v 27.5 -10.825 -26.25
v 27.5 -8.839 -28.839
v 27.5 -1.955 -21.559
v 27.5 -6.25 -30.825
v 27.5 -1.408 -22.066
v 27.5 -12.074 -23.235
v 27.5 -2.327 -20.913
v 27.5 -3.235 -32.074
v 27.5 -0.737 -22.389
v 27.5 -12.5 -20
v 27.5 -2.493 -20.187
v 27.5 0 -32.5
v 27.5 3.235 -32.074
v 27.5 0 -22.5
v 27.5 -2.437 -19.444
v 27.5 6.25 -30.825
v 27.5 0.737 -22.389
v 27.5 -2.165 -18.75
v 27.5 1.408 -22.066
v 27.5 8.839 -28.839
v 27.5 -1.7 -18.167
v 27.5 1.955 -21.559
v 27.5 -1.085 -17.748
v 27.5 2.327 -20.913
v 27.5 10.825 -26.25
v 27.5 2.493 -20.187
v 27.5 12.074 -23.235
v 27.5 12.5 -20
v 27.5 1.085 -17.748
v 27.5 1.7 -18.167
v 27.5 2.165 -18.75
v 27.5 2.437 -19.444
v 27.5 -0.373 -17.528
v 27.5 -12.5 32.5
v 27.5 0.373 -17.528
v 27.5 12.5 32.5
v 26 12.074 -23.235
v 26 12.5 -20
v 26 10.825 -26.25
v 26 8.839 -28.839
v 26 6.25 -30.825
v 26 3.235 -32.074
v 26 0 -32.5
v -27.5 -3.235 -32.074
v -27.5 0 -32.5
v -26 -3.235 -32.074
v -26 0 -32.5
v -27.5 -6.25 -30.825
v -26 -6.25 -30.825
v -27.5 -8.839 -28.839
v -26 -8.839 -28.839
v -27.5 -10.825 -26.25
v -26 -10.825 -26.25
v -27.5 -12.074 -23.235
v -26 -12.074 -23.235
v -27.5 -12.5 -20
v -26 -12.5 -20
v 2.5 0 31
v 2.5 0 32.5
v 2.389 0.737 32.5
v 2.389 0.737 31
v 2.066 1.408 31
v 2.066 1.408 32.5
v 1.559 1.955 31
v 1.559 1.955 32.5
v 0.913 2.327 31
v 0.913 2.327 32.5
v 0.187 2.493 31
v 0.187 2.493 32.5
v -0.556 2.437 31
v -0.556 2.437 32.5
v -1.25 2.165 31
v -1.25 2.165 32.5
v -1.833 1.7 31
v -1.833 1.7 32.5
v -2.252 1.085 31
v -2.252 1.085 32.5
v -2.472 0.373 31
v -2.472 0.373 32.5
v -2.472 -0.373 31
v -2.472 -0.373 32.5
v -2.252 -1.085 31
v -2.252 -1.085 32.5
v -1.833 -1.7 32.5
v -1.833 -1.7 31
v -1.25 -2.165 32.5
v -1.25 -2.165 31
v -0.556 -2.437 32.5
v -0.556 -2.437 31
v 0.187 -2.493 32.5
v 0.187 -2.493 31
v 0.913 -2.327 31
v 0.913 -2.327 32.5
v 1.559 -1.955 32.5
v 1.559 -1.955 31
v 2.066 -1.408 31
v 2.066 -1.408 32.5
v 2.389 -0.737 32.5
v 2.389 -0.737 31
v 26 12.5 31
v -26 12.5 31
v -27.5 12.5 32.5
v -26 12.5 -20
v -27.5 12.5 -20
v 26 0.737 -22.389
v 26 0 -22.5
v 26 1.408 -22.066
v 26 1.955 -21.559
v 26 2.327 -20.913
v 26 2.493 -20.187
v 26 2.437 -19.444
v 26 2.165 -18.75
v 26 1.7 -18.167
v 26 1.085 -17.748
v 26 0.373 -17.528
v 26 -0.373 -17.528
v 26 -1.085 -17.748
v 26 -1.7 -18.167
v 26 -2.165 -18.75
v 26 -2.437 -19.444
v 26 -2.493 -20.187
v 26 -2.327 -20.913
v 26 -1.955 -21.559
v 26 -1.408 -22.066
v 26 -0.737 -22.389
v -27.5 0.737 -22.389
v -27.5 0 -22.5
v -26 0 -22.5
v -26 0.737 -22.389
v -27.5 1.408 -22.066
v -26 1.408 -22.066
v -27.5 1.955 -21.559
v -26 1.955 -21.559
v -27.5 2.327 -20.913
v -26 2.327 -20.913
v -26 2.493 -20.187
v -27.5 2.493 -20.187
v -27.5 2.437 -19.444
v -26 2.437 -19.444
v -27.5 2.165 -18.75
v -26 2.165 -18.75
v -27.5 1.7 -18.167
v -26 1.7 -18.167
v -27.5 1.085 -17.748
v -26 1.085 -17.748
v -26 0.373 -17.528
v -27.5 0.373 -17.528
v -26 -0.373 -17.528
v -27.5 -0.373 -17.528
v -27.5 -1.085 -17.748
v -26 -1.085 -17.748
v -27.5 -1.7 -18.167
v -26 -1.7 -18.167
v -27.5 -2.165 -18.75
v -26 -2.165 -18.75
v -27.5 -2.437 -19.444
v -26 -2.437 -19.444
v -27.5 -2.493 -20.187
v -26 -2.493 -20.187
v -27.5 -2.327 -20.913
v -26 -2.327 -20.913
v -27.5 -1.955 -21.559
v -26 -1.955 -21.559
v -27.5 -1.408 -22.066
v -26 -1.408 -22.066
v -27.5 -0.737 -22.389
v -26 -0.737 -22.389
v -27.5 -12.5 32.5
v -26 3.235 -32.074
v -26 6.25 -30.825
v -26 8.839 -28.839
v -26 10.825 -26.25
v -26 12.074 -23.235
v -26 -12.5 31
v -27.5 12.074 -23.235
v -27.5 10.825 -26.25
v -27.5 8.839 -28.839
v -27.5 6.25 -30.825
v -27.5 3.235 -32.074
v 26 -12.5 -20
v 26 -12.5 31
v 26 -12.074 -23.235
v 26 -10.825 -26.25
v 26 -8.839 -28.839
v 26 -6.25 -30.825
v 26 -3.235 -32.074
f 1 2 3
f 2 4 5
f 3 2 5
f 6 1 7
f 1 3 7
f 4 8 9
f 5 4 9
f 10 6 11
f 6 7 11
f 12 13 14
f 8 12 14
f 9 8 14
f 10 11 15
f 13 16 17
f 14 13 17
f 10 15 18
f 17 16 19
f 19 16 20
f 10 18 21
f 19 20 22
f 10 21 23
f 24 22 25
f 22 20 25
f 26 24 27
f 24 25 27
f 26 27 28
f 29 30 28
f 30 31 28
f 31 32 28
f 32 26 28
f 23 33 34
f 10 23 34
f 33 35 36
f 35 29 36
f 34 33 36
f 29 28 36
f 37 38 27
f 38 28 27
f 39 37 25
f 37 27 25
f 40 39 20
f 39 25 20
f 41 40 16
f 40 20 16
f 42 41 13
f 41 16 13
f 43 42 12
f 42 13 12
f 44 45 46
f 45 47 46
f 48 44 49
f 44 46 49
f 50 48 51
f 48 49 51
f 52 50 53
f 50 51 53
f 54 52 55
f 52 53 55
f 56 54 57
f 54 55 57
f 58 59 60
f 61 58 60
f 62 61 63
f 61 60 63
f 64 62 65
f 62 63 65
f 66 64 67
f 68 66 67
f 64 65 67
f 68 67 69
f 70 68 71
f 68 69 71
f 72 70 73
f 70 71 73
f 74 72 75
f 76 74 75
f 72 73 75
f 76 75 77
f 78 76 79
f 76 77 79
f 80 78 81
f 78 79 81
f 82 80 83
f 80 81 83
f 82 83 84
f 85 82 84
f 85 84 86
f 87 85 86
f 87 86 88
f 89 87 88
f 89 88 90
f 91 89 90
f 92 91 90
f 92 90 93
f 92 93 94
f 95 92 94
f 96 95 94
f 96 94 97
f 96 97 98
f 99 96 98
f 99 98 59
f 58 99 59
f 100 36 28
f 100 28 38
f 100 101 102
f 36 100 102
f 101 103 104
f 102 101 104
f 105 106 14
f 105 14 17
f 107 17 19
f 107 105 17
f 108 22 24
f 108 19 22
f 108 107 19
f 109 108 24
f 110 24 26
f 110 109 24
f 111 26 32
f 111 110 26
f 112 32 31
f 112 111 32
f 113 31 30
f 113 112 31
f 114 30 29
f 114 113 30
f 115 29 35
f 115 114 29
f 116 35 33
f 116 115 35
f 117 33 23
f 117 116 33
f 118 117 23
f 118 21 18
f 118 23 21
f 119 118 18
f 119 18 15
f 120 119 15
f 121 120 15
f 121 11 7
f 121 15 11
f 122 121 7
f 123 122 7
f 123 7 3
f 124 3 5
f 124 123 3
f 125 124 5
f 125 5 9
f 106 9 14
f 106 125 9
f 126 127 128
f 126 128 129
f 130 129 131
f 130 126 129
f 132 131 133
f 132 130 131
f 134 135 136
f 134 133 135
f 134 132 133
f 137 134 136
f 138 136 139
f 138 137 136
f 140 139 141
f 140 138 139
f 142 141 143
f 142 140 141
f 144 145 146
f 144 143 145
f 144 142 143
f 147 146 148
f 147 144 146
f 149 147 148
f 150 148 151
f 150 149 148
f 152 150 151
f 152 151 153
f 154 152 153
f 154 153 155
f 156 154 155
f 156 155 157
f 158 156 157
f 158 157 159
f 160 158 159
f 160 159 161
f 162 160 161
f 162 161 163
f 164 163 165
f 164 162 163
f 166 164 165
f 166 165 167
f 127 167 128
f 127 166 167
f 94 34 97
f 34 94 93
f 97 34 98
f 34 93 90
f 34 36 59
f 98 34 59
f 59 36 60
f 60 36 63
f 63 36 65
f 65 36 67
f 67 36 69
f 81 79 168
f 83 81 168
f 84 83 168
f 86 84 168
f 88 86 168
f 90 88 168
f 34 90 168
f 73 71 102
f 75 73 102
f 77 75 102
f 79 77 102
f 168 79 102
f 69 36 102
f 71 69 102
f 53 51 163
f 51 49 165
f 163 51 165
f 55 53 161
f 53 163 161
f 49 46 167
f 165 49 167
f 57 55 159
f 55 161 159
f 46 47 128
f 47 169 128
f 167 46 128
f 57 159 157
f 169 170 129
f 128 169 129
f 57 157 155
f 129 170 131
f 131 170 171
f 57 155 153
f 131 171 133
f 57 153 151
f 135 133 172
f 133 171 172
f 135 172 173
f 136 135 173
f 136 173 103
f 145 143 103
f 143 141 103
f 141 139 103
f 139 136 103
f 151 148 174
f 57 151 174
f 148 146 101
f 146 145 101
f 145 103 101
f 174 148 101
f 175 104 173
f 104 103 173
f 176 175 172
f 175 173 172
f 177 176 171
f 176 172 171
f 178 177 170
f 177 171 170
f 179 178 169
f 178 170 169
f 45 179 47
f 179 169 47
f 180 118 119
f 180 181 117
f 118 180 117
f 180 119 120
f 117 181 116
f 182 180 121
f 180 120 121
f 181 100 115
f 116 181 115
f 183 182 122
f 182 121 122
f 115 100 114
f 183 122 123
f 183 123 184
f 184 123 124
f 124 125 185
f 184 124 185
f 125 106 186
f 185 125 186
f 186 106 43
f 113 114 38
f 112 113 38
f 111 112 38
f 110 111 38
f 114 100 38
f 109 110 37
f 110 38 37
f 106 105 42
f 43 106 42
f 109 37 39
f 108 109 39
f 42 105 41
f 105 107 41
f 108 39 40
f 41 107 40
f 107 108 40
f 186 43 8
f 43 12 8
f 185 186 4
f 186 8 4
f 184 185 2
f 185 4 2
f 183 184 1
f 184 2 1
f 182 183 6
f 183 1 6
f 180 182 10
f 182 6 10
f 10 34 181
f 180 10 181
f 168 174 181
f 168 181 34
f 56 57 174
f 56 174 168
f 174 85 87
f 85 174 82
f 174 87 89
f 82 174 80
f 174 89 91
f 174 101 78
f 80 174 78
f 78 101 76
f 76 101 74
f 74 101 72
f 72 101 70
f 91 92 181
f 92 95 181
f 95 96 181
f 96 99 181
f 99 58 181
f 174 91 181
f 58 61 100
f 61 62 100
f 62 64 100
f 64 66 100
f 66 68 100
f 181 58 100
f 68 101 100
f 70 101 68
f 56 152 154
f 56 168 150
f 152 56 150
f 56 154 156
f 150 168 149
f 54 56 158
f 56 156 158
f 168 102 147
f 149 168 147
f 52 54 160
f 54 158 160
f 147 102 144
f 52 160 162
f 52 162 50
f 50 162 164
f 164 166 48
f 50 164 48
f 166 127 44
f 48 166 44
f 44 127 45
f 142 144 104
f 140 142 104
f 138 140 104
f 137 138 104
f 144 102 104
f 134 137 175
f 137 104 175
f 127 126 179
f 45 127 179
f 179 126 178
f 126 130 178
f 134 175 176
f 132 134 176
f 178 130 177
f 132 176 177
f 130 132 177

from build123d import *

# Parameters (mm, degrees)
BOSS_EXTRUDE1_DEPTH     = 12.5
FILLET1_R               = 12.5
CUT_EXTRUDE1_DEPTH      = 45.370598373
CUT_EXTRUDE1_DEPTH_BACK = 45.370598373
SKETCH2_R               = 2.5
SKETCH3_R               = 2.5
CUT_EXTRUDE2_DEPTH      = 10


with BuildPart() as part:
    # Sketch1 → Boss-Extrude1 (new, symmetric)
    with BuildSketch(Plane(origin=(0, 0, 0), x_dir=(1, 0, 0), z_dir=(0, 1, 0))):
        Polygon((26, -31), (26, 32.5), (27.5, 32.5), (27.5, -32.5), (-27.5, -32.5), (-27.5, 32.5), (-26, 32.5), (-26, -31), align=None)
    extrude(amount=BOSS_EXTRUDE1_DEPTH, both=True)

    # Fillet1
    fillet1_edges = [part.edges().sort_by_distance(p)[0] for p in [
        (-26.75, -12.5, -32.5),
        (-26.75, 12.5, -32.5),
        (26.75, -12.5, -32.5),
        (26.75, 12.5, -32.5),
    ]]
    fillet(fillet1_edges, radius=FILLET1_R - 0.0001)  # a hair under: the kernel refuses the full size

    # Sketch2 → Cut-Extrude1 (cut, two sides: drawn at the far end of the back side and taken through both)
    with BuildSketch(Plane(origin=(0, 0, 0), x_dir=(0, 0, -1), z_dir=(1, 0, 0)).offset(-CUT_EXTRUDE1_DEPTH_BACK)):
        with Locations((20, 0)):
            Circle(SKETCH2_R)
    extrude(amount=CUT_EXTRUDE1_DEPTH + CUT_EXTRUDE1_DEPTH_BACK, mode=Mode.SUBTRACT)

    # Sketch3 → Cut-Extrude2 (cut)
    with BuildSketch(Plane.XY.offset(32.5)):
        Circle(SKETCH3_R)
    extrude(amount=-CUT_EXTRUDE2_DEPTH, mode=Mode.SUBTRACT)


solid = part.part
